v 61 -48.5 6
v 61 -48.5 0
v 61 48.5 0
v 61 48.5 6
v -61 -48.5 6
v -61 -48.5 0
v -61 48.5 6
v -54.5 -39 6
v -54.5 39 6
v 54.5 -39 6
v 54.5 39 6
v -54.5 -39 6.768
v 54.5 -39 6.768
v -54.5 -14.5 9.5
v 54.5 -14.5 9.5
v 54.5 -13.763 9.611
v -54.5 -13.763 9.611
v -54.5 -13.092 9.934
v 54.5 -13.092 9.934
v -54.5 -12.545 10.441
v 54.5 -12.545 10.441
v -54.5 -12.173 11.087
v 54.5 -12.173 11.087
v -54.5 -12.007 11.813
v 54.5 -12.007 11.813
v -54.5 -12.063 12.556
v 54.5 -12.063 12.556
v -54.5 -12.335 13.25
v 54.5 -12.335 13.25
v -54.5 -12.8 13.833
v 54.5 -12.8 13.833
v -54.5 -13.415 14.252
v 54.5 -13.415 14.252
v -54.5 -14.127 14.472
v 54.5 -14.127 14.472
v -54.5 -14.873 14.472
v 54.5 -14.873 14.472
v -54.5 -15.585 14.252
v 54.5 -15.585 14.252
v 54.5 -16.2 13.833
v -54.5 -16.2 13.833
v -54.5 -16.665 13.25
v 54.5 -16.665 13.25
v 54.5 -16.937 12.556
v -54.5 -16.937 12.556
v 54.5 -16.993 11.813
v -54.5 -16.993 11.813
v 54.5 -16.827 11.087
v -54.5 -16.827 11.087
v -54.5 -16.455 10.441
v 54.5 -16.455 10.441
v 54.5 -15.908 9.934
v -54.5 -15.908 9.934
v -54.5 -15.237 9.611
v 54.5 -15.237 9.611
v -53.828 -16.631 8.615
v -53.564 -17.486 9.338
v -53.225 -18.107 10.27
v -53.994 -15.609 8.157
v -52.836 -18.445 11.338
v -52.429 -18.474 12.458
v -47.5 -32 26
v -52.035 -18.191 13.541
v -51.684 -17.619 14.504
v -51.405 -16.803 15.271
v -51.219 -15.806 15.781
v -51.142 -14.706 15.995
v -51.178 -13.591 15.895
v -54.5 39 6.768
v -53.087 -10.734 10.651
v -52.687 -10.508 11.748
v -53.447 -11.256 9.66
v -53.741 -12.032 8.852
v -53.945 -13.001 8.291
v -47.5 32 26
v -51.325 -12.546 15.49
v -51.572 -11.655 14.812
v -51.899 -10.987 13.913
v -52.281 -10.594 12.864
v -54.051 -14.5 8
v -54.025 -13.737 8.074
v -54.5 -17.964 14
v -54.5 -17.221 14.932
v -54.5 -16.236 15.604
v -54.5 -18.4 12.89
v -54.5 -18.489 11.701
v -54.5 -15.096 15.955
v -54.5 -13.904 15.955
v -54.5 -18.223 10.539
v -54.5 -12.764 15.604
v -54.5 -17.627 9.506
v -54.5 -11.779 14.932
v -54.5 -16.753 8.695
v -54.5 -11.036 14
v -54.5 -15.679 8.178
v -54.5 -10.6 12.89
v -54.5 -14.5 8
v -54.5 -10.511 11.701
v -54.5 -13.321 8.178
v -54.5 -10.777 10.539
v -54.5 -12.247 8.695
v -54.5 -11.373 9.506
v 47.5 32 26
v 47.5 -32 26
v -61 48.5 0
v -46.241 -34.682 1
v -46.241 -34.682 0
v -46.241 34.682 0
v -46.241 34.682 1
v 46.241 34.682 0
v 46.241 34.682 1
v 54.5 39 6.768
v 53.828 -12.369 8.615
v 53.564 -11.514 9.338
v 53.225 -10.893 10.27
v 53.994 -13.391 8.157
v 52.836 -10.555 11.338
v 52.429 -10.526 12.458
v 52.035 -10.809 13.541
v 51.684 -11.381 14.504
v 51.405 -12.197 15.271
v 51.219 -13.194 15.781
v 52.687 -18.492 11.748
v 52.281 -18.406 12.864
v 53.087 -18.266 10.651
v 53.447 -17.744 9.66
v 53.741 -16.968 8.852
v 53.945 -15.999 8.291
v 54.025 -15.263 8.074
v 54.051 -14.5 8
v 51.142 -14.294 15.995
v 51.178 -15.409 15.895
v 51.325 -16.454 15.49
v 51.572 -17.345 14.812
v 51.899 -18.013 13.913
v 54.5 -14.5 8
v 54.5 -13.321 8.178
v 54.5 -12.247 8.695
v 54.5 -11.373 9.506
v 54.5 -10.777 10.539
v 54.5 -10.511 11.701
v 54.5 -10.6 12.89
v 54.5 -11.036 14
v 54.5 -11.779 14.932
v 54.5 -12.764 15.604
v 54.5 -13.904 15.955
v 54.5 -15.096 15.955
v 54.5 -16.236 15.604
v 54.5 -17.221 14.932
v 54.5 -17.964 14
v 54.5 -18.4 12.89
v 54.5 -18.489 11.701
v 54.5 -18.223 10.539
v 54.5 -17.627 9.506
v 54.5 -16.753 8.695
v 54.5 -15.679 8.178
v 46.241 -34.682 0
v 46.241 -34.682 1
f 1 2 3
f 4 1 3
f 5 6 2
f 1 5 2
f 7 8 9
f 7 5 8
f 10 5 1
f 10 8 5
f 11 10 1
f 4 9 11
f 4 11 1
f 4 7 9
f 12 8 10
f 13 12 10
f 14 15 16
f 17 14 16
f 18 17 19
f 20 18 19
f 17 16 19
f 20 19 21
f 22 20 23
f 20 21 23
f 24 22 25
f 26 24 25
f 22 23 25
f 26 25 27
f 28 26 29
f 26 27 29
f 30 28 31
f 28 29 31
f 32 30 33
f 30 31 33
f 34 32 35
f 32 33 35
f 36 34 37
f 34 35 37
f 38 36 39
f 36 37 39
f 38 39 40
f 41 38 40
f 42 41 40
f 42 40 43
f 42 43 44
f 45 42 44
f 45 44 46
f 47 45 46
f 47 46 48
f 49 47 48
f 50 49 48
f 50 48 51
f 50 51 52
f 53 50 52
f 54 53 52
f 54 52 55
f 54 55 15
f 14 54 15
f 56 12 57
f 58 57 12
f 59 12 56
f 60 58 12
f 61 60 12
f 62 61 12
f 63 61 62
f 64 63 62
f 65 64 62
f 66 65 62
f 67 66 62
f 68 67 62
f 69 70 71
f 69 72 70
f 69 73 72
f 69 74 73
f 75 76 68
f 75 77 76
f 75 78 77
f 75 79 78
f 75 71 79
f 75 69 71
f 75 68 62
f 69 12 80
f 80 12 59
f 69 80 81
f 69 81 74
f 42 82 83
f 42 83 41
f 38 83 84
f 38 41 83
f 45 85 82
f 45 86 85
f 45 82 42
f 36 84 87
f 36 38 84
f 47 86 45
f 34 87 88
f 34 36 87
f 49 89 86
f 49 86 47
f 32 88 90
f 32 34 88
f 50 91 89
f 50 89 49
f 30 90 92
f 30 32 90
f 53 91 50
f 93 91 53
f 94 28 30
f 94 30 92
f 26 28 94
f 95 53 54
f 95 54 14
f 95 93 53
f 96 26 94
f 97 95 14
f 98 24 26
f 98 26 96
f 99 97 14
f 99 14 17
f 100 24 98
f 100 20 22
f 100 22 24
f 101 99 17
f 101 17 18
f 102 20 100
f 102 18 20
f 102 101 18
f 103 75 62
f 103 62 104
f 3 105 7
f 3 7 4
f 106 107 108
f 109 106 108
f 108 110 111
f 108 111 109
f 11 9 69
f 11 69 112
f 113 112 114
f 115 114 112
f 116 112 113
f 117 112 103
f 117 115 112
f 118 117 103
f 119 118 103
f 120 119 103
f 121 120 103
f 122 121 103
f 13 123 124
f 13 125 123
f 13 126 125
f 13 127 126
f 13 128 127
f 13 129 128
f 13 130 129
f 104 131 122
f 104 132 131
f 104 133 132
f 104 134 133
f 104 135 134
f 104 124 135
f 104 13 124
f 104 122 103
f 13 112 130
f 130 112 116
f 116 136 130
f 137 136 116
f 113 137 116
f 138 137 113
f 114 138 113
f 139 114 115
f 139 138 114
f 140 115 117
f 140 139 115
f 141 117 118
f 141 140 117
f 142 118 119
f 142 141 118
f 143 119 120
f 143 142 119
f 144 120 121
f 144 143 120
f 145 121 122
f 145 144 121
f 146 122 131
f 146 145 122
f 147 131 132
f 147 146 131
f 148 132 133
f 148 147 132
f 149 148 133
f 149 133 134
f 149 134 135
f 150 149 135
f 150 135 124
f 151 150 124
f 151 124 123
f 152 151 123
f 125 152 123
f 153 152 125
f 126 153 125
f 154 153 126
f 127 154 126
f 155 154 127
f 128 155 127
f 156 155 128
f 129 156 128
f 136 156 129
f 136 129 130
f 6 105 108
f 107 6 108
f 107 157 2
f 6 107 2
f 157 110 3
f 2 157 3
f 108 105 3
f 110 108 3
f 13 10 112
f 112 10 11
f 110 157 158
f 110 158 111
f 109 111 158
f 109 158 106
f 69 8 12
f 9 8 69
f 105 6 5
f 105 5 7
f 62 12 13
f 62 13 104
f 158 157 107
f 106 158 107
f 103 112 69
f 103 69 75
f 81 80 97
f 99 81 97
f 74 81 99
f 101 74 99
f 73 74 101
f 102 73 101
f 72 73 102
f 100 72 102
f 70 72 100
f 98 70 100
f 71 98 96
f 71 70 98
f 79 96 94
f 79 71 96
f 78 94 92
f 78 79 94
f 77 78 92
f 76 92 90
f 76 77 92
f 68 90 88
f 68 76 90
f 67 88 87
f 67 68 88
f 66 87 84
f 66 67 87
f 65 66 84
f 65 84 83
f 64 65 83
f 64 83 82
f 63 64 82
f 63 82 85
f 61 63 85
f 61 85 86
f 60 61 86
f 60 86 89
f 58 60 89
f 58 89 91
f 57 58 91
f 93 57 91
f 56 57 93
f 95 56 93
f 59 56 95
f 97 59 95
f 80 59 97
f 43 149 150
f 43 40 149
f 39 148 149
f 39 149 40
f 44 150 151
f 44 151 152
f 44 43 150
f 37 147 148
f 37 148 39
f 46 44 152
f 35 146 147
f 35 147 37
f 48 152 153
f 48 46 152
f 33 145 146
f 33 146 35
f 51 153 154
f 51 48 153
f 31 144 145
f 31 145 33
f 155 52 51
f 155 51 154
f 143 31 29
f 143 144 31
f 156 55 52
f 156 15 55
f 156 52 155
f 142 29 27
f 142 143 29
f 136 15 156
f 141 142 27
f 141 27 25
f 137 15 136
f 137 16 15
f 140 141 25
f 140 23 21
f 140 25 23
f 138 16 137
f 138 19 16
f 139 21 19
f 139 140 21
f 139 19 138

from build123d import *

# Parameters (mm, degrees)
SKIZZE1_W                       = 122
SKIZZE1_H                       = 97
AUFSATZ_LINEAR_AUSTRAGEN1_DEPTH = 6
SKIZZE2_W                       = 109
SKIZZE2_H                       = 78
AUFSATZ_LINEAR_AUSTRAGEN2_DEPTH = 20
SCHNITT_LINEAR_AUSTRAGEN1_REACH = 129.939
SKIZZE3_R                       = 2.5
FASE1_SIZE                      = 19.232341936
FASE1_SIZE_2                    = 7
AUFSATZ_LINEAR_AUSTRAGEN3_REACH = 129.939
SKIZZE4_R                       = 4
SKIZZE4_R_2                     = 2.5
SKIZZE5_W                       = 92.481860848
SKIZZE5_H                       = 69.364192104
SCHNITT_LINEAR_AUSTRAGEN2_DEPTH = 1


with BuildPart() as part:
    # Skizze1 → Aufsatz-Linear austragen1 (new body)
    with BuildSketch(Plane.XY):
        Rectangle(SKIZZE1_W, SKIZZE1_H)
    extrude(amount=AUFSATZ_LINEAR_AUSTRAGEN1_DEPTH)

    # Skizze2 → Aufsatz-Linear austragen2 (add)
    with BuildSketch(Plane.XY.offset(6)):
        Rectangle(SKIZZE2_W, SKIZZE2_H)
    extrude(amount=AUFSATZ_LINEAR_AUSTRAGEN2_DEPTH)

    # Skizze3 → Schnitt-Linear austragen1 (cut, up to next)
    with BuildSketch(Plane(origin=(54.5, 0, 0), x_dir=(0, 0, -1), z_dir=(1, 0, 0)), mode=Mode.PRIVATE) as schnitt_linear_austragen1_sk1:
        with Locations((-12, -14.5)):
            Circle(SKIZZE3_R)
    schnitt_linear_austragen1_tool1 = extrude(schnitt_linear_austragen1_sk1.sketch, amount=-SCHNITT_LINEAR_AUSTRAGEN1_REACH, mode=Mode.PRIVATE) & part.part
    add(schnitt_linear_austragen1_tool1.solids().sort_by_distance((54.5, -14.5, 12))[0], mode=Mode.SUBTRACT)

    # Fase1
    # the kernel refuses this chamfer: 19.232341936, 7 mm, written as the material it takes off along each edge
    with BuildSketch(Plane(origin=(54.5, -88.892440145, 26), x_dir=(0.013184058198645607, 0, -0.9999130865277316), z_dir=(0, 1, 0)), Plane(origin=(-54.5, 88.892440145, 26), x_dir=(-0.013184058198645607, 0, -0.9999130865277316), z_dir=(0, -1, 0))) as fase1_piece_1:
        Polygon((FASE1_SIZE * 0.999913086537, FASE1_SIZE * 0.0131840581988), (-FASE1_SIZE_2 * 0.0131840581986, FASE1_SIZE_2 * 0.999913086528), (0, 0), align=None)
    extrude(amount=177.784880291, mode=Mode.SUBTRACT)
    with BuildSketch(Plane(origin=(104.392440145, 39, 26), x_dir=(0, 0.013184058198645607, -0.9999130865277316), z_dir=(-1, 0, 0)), Plane(origin=(-104.392440145, -39, 26), x_dir=(0, -0.013184058198645607, -0.9999130865277316), z_dir=(1, 0, 0))) as fase1_piece_2:
        Polygon((FASE1_SIZE * 0.999913086537, FASE1_SIZE * 0.0131840581988), (-FASE1_SIZE_2 * 0.0131840581986, FASE1_SIZE_2 * 0.999913086528), (0, 0), align=None)
    extrude(amount=208.784880291, mode=Mode.SUBTRACT)

    # Aufsatz-Linear austragen3: up to this face of the body (flat: up to its plane)
    aufsatz_linear_austragen3_end = Plane(part.part.faces().sort_by_distance((-54.5, 0, 6.383829032))[0])
    # Skizze4 → Aufsatz-Linear austragen3 (add, up to the picked face)
    with BuildSketch(Plane(origin=(54.5, 0, 0), x_dir=(0, 0, -1), z_dir=(1, 0, 0)), mode=Mode.PRIVATE) as aufsatz_linear_austragen3_sk1:
        with Locations((-12, -14.5)):
            Circle(SKIZZE4_R)
        with Locations((-12, -14.5)):
            Circle(SKIZZE4_R_2, mode=Mode.SUBTRACT)
    aufsatz_linear_austragen3_tool1 = split(extrude(aufsatz_linear_austragen3_sk1.sketch, amount=-AUFSATZ_LINEAR_AUSTRAGEN3_REACH, mode=Mode.PRIVATE), bisect_by=aufsatz_linear_austragen3_end, keep=Keep.BOTH, mode=Mode.PRIVATE)
    add(aufsatz_linear_austragen3_tool1.solids().sort_by(Axis((54.5, -14.5, 15.886863), (-1, 0, 0)))[0])

    # Skizze5 → Schnitt-Linear austragen2 (cut)
    with BuildSketch(Plane(origin=(0, 0, 0), x_dir=(-1, 0, 0), z_dir=(0, 0, -1))):
        Rectangle(SKIZZE5_W, SKIZZE5_H)
    extrude(amount=-SCHNITT_LINEAR_AUSTRAGEN2_DEPTH, mode=Mode.SUBTRACT)


solid = part.part
